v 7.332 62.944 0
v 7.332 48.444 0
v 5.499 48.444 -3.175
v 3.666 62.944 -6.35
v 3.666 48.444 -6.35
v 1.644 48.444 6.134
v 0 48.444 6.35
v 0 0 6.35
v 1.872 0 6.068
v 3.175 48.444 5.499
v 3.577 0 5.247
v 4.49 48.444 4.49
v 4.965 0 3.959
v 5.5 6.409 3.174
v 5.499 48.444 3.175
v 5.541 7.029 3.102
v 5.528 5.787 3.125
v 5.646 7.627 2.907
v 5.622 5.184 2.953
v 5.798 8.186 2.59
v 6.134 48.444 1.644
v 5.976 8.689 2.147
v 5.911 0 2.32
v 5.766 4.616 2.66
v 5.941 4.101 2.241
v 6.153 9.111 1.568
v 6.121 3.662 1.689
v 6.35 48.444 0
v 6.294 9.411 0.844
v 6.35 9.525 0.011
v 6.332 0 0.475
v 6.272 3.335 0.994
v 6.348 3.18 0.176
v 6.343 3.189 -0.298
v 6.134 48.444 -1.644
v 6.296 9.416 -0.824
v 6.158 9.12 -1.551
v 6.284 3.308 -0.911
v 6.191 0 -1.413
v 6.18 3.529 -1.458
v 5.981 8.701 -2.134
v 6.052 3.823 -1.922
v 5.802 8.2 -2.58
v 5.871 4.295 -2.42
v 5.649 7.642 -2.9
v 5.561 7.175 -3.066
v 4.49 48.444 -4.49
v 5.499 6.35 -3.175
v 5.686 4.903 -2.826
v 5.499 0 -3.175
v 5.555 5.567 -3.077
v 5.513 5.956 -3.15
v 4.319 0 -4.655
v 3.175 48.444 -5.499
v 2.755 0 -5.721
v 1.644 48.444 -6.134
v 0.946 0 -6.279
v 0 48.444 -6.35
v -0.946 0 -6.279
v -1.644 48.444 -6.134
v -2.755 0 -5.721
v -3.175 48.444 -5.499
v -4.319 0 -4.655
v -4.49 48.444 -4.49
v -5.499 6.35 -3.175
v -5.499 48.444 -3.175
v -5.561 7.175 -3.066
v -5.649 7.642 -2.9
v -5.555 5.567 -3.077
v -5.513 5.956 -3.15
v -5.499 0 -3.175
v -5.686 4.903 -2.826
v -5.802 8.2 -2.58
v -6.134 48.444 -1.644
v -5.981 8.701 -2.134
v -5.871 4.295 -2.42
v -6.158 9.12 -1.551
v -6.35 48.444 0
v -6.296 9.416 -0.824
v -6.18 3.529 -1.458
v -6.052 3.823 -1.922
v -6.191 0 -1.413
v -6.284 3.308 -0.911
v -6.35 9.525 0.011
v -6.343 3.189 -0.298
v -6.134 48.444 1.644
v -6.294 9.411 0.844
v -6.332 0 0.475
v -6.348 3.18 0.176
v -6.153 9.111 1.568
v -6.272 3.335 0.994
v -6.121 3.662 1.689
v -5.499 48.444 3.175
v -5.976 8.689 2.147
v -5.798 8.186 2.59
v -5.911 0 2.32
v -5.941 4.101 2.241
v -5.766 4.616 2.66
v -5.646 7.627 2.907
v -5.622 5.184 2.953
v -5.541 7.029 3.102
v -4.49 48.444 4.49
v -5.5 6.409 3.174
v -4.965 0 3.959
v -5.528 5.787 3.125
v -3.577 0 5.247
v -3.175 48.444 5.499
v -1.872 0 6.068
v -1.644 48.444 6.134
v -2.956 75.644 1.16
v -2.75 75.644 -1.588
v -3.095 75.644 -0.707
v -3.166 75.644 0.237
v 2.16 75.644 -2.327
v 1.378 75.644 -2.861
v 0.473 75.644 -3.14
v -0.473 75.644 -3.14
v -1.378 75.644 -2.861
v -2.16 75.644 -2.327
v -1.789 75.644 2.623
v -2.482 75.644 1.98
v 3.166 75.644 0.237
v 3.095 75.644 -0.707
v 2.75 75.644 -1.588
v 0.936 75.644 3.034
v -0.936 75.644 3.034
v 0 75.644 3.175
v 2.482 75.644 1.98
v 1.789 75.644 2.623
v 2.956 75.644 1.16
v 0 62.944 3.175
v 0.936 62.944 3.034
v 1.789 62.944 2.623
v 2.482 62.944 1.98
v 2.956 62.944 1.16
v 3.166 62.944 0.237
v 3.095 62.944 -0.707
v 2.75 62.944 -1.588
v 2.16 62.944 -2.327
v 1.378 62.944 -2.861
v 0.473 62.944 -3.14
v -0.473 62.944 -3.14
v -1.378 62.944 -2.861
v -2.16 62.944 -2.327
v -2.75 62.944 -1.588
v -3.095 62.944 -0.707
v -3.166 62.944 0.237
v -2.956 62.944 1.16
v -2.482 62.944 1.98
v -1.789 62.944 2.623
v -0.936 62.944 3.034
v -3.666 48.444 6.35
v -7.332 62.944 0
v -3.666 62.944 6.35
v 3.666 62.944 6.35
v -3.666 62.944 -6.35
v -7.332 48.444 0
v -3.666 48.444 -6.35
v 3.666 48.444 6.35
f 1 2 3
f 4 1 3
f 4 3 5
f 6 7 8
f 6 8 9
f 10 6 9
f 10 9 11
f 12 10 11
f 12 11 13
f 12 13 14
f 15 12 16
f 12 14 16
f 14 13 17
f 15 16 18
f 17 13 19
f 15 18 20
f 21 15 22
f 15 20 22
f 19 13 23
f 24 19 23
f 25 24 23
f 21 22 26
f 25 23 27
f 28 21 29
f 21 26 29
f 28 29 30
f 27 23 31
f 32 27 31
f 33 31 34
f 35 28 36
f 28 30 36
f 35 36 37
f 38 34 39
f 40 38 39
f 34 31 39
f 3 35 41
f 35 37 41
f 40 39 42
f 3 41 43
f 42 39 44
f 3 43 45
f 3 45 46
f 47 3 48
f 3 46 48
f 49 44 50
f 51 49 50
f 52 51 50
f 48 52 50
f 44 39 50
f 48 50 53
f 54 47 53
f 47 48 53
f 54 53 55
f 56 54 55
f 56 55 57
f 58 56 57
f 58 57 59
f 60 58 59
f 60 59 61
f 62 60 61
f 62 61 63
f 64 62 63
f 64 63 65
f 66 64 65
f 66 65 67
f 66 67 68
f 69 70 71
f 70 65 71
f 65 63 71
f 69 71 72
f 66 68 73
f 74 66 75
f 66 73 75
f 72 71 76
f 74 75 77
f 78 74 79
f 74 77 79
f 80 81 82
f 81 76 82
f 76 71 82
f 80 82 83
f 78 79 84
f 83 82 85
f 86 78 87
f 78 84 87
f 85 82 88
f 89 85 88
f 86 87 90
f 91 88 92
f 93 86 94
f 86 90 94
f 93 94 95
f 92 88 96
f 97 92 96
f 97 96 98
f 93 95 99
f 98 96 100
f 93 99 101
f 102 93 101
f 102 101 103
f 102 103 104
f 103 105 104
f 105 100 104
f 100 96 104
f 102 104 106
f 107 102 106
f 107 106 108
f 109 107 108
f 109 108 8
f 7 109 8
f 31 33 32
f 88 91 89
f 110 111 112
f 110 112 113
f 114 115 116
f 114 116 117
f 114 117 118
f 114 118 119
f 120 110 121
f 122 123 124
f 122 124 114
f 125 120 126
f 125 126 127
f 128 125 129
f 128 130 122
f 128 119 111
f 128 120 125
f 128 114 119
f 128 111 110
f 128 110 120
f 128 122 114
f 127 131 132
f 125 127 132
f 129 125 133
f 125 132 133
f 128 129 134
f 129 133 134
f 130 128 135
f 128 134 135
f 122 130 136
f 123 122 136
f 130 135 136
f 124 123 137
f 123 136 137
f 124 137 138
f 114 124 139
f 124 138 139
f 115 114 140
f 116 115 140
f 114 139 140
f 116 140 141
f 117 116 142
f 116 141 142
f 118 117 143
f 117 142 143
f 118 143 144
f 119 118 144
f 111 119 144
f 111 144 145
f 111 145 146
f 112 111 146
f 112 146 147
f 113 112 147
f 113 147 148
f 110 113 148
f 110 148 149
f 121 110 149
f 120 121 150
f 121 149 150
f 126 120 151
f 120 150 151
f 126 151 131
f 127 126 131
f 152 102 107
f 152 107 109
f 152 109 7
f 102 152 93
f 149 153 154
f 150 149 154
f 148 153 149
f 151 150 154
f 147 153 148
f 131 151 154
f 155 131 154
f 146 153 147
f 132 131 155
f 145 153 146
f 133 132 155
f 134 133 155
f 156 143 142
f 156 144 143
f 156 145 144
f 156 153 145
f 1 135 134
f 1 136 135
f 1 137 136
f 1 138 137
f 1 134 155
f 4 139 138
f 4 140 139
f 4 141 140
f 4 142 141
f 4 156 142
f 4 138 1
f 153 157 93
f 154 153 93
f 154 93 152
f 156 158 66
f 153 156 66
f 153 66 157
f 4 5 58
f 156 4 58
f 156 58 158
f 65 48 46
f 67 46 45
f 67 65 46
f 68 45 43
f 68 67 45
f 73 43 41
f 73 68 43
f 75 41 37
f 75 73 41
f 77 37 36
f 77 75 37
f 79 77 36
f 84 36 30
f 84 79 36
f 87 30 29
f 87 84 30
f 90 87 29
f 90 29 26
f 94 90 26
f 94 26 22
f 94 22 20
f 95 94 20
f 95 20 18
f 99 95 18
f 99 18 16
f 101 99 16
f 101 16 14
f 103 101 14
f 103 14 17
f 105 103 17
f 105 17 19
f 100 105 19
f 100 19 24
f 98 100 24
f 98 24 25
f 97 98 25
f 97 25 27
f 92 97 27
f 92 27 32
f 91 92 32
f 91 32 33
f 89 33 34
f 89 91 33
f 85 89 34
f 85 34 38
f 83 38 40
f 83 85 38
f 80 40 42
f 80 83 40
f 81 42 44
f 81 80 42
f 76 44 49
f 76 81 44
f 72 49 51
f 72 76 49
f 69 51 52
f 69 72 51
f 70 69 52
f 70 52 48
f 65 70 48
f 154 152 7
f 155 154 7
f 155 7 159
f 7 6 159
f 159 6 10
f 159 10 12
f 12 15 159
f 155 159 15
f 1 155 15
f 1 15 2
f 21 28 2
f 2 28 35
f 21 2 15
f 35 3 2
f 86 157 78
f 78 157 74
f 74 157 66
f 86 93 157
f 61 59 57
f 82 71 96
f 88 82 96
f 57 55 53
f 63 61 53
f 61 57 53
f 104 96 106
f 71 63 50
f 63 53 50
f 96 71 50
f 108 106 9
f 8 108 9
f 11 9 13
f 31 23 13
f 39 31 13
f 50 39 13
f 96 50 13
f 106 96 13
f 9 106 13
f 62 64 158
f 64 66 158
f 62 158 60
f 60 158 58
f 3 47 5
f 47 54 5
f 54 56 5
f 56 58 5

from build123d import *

# Parameters (mm, degrees)
SKETCH1_R               = 6.35
BOSS_EXTRUDE1_DEPTH     = 48.44415
BOSS_EXTRUDE2_DEPTH     = 14.499999936
CUT_EXTRUDE1_DEPTH      = 64.687140339
CUT_EXTRUDE1_DEPTH_BACK = 64.687140339
SKETCH4_R               = 3.175
SKETCH5_R               = 3.175
BOSS_EXTRUDE3_DEPTH     = 12.7


with BuildPart() as part:
    # Sketch1 → Boss-Extrude1 (new body)
    with BuildSketch(Plane(origin=(0, 0, 0), x_dir=(1, 0, 0), z_dir=(0, 1, 0))):
        with Locations(Location((0, 0, 0), (0, 0, 270))):
            Circle(SKETCH1_R)
    extrude(amount=BOSS_EXTRUDE1_DEPTH)

    # Sketch2 → Boss-Extrude2 (add)
    with BuildSketch(Plane(origin=(0, 48.44415, 0), x_dir=(1, 0, 0), z_dir=(0, 1, 0))):
        Polygon((7.332348419, 0), (3.666174209, 6.35), (-3.666174209, 6.35), (-7.332348419, 0), (-3.666174209, -6.35), (3.666174209, -6.35), align=None)
    extrude(amount=BOSS_EXTRUDE2_DEPTH)

    # Sketch4 → Cut-Extrude1 (cut, two sides: drawn at the far end of the back side and taken through both)
    with BuildSketch(Plane(origin=(0, 0, 0), x_dir=(0, 0, -1), z_dir=(1, 0, 0)).offset(-CUT_EXTRUDE1_DEPTH_BACK)):
        with Locations((0, 6.35)):
            Circle(SKETCH4_R)
    extrude(amount=CUT_EXTRUDE1_DEPTH + CUT_EXTRUDE1_DEPTH_BACK, mode=Mode.SUBTRACT)

    # Sketch5 → Boss-Extrude3 (add)
    with BuildSketch(Plane(origin=(0, 62.944149936, 0), x_dir=(1, 0, 0), z_dir=(0, 1, 0))):
        with Locations(Location((0, 0, 0), (0, 0, 270))):
            Circle(SKETCH5_R)
    extrude(amount=BOSS_EXTRUDE3_DEPTH)


solid = part.part
